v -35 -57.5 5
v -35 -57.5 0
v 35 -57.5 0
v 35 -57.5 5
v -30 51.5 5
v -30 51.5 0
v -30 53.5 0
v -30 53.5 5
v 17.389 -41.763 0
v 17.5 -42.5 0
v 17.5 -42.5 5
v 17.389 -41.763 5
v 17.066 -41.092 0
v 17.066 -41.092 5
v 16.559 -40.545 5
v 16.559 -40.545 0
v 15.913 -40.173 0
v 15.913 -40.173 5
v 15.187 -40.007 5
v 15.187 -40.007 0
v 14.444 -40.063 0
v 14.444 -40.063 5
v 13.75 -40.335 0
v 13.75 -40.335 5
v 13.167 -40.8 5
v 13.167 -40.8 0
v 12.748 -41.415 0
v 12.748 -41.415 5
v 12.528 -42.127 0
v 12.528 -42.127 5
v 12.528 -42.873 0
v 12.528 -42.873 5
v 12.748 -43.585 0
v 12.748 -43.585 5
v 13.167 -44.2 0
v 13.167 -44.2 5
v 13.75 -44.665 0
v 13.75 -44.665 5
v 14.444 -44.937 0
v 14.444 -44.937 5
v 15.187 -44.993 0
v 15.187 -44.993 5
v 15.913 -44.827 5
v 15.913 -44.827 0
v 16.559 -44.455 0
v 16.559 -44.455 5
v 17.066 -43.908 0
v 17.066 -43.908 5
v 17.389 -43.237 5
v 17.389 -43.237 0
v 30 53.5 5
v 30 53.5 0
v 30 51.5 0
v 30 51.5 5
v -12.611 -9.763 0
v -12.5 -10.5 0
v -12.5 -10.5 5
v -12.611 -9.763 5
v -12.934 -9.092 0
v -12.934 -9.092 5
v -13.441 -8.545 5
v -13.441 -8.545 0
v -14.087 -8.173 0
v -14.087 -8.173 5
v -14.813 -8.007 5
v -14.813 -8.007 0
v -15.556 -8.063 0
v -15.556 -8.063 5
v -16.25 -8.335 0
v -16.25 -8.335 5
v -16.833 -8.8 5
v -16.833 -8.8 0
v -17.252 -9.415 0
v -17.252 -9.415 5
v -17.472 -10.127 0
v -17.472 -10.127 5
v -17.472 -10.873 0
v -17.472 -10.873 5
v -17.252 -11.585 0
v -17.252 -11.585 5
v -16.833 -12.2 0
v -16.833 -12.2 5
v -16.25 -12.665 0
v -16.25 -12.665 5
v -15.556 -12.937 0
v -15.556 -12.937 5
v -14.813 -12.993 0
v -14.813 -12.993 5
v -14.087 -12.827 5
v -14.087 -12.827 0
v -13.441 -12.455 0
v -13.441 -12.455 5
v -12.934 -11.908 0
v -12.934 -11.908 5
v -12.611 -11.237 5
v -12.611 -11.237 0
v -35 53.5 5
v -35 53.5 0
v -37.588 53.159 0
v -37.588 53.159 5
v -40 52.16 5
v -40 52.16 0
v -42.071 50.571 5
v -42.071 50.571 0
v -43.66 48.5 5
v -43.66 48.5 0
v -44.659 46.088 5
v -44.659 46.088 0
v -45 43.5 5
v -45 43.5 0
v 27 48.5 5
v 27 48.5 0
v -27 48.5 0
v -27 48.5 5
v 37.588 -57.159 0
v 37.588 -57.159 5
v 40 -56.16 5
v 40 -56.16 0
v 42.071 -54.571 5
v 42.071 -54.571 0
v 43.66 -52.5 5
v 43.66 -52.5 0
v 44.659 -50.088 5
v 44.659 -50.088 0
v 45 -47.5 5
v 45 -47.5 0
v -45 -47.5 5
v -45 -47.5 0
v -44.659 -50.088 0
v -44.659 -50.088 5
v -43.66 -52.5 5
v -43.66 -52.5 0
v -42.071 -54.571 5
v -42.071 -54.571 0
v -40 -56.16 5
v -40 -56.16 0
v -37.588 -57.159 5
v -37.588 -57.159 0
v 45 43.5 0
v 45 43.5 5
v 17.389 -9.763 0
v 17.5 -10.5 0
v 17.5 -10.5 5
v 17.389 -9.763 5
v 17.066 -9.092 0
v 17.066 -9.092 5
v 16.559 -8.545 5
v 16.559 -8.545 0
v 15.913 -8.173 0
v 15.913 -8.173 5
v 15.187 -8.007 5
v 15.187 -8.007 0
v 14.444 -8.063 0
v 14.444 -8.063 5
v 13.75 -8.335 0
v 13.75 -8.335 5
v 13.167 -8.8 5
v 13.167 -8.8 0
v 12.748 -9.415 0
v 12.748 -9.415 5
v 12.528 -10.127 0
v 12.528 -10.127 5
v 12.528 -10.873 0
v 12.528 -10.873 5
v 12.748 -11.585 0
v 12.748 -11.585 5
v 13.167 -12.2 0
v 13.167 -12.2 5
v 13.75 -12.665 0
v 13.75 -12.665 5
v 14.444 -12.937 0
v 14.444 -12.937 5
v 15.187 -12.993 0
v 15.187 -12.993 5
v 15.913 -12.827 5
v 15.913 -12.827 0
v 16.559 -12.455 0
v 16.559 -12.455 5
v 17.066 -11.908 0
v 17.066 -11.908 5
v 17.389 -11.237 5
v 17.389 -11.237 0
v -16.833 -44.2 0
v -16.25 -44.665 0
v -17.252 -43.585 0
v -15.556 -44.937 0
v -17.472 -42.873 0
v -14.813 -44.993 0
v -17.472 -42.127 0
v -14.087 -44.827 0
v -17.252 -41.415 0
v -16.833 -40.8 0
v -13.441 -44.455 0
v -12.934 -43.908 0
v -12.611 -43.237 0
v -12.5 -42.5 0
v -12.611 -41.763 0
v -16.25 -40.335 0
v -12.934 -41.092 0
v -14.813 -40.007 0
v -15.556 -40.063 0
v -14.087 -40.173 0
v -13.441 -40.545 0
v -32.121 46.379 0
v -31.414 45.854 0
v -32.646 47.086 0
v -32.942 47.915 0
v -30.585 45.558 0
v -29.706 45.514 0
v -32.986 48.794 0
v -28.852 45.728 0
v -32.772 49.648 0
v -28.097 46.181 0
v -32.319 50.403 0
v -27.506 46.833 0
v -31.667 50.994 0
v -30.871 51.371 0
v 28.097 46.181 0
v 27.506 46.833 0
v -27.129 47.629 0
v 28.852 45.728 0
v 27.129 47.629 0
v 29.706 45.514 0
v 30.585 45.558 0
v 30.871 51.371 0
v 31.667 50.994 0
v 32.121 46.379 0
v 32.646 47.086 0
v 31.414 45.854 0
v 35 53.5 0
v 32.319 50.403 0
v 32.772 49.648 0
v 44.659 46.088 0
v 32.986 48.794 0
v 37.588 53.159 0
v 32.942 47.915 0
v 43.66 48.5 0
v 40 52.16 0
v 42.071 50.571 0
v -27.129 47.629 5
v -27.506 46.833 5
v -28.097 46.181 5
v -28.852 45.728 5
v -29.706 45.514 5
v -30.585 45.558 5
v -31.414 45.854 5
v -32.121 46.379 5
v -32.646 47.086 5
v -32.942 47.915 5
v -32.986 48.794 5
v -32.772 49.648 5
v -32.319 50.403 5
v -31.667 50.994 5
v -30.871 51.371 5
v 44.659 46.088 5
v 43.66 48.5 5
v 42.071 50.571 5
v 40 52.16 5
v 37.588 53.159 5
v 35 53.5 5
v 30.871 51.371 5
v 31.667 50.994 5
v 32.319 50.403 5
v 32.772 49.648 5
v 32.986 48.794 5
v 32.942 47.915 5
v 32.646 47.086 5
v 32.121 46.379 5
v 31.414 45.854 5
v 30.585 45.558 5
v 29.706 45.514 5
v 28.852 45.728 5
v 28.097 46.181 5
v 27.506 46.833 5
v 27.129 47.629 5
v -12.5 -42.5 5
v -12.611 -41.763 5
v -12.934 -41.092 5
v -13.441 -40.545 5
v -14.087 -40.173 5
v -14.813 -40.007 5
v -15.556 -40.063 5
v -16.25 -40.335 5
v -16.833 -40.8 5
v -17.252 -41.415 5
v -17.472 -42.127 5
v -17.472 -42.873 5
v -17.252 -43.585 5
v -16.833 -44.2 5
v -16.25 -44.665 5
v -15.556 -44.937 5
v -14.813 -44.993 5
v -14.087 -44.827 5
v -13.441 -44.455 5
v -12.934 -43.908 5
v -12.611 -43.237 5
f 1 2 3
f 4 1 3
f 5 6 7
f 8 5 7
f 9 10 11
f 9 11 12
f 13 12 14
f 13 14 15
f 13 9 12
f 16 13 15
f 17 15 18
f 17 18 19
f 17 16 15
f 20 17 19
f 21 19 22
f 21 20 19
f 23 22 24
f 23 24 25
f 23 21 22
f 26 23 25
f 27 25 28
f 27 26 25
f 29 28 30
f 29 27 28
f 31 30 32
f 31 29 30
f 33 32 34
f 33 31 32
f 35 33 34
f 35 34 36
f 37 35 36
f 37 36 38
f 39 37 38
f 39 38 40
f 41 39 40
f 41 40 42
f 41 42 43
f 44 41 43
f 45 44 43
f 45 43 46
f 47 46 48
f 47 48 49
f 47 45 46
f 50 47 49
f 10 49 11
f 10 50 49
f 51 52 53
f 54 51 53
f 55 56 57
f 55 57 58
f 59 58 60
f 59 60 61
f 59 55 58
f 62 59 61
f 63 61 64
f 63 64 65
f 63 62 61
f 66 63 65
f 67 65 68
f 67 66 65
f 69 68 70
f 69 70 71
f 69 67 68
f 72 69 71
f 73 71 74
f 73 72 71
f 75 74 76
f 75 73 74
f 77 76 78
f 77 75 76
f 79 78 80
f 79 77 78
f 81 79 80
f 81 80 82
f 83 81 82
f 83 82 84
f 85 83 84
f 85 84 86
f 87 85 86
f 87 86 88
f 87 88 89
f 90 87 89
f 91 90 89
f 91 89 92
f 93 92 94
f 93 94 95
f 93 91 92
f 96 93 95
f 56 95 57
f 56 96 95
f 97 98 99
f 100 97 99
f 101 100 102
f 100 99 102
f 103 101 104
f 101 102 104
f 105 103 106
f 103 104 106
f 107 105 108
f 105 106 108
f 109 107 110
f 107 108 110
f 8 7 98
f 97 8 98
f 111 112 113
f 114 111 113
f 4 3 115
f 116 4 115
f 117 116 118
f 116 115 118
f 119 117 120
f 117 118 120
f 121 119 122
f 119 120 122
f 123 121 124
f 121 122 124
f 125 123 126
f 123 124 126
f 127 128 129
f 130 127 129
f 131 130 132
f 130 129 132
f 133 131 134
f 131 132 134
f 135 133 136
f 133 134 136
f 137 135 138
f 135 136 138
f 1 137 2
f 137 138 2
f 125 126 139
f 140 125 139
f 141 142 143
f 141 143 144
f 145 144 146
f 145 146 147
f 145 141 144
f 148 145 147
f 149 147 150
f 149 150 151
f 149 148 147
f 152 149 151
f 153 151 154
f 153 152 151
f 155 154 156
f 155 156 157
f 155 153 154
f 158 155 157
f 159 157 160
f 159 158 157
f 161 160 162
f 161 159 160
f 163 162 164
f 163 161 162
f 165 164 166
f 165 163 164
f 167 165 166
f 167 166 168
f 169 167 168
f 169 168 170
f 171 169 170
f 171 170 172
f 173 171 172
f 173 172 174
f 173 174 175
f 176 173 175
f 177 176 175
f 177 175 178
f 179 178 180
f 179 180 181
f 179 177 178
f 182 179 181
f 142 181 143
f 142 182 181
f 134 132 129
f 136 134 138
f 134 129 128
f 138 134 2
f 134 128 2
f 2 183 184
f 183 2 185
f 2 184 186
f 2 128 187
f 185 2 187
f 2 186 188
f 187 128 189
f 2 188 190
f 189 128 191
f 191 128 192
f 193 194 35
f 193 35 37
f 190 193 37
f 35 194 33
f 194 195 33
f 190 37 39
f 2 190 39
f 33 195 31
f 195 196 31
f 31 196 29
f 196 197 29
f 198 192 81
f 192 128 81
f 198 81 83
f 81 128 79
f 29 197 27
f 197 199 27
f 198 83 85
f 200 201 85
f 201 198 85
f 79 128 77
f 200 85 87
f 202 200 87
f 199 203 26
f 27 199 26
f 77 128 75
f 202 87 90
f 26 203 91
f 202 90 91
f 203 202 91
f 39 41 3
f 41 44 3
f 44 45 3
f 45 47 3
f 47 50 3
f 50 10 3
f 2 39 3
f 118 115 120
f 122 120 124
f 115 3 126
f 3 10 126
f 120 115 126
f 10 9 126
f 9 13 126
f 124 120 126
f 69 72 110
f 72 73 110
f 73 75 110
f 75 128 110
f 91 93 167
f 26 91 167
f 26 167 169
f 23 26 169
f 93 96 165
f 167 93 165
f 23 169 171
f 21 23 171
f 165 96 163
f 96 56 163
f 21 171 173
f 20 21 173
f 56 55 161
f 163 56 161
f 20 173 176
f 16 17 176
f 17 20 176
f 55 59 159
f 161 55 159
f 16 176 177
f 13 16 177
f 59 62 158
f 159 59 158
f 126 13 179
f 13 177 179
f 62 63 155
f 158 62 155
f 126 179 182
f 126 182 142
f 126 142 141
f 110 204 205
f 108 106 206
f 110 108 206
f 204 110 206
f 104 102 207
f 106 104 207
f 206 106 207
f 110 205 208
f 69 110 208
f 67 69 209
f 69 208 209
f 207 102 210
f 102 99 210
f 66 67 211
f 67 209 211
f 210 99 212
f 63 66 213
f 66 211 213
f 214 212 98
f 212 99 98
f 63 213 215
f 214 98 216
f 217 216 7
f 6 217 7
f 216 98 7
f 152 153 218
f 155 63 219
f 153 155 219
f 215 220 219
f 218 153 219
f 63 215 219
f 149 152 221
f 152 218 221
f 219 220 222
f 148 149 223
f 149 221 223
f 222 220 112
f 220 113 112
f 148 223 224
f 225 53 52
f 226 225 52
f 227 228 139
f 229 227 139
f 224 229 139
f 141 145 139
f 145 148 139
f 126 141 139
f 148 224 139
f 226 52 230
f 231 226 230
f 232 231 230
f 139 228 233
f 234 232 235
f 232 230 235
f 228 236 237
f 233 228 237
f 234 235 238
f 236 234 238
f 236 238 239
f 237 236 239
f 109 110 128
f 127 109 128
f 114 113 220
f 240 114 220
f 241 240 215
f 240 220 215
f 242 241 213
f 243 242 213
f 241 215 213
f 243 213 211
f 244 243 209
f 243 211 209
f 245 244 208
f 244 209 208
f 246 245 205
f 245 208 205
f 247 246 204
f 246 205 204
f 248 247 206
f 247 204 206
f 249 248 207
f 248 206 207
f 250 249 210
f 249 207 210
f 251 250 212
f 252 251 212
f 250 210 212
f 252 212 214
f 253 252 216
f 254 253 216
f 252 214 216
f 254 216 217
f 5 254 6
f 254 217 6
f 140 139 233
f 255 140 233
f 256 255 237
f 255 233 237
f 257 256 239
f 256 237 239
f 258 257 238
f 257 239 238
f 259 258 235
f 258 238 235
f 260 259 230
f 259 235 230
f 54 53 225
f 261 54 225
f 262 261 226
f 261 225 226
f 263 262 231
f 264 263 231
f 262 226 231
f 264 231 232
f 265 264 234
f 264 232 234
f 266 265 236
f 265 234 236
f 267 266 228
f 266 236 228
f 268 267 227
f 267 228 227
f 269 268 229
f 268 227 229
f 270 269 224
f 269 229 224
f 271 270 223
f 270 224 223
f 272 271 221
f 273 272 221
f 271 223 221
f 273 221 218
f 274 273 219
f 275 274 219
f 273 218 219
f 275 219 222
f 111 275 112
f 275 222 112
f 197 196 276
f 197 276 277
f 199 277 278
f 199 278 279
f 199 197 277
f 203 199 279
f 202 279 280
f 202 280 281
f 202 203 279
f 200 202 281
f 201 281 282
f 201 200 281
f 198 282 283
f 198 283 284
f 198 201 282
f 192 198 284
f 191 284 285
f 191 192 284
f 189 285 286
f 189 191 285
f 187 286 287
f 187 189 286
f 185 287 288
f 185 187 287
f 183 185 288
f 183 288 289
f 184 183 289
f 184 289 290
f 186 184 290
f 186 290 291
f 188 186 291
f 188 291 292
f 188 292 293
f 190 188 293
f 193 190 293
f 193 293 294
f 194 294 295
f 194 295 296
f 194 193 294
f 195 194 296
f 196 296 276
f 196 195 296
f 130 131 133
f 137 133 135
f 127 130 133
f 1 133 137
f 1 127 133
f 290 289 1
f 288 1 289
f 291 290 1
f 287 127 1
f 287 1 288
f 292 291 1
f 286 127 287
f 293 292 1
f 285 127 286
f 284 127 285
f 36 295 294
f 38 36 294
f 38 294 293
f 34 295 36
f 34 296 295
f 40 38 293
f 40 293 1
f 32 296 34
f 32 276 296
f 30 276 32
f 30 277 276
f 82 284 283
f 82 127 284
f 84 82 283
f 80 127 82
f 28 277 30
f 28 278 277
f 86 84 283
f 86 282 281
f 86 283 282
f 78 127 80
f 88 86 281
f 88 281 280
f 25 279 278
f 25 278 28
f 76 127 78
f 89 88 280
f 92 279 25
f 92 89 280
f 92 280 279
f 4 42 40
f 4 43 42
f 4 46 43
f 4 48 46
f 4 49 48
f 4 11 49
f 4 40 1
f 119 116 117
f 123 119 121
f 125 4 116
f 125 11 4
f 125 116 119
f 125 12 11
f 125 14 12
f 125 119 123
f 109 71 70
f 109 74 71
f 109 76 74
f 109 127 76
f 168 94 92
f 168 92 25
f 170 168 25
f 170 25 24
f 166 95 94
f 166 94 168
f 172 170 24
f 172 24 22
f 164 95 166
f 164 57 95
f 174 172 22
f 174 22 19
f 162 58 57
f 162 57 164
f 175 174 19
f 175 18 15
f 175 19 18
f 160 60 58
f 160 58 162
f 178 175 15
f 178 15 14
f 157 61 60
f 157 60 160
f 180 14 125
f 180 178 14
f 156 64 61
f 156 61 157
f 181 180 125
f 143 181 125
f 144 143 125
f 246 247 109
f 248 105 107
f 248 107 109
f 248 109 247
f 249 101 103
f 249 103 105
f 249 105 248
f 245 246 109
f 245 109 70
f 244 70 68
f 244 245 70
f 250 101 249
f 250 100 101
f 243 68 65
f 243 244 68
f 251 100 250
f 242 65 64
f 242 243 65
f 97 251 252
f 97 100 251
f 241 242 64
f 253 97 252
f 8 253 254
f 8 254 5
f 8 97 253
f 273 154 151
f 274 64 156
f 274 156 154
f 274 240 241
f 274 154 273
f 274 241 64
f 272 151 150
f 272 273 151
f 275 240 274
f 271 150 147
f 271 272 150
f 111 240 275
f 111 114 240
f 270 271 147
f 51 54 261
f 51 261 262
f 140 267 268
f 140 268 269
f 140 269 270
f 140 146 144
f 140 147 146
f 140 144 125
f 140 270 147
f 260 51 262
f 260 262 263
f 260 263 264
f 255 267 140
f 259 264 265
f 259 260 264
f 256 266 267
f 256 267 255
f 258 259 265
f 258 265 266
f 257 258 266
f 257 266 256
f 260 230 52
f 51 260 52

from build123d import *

# Parameters (mm, degrees)
F0_R     = 2.5
F1_DEPTH = 5


with BuildPart() as f1:
    # F0 (on Top) → F1 (new body)
    with BuildSketch(Plane.XY):
        with BuildLine():
            Line((-35, -57.5), (35, -57.5))
            ThreePointArc((35, -57.5), (42.071068, -54.571068), (45, -47.5))
            Line((45, -47.5), (45, 43.5))
            ThreePointArc((45, 43.5), (42.071068, 50.571068), (35, 53.5))
            Line((35, 53.5), (30, 53.5))
            Line((30, 53.5), (30, 51.5))
            ThreePointArc((30, 51.5), (32.12132, 46.37868), (27, 48.5))
            Line((27, 48.5), (-27, 48.5))
            ThreePointArc((-27, 48.5), (-32.12132, 46.37868), (-30, 51.5))
            Line((-30, 51.5), (-30, 53.5))
            Line((-30, 53.5), (-35, 53.5))
            ThreePointArc((-35, 53.5), (-42.071068, 50.571068), (-45, 43.5))
            Line((-45, 43.5), (-45, -47.5))
            ThreePointArc((-45, -47.5), (-42.071068, -54.571068), (-35, -57.5))
        make_face()
        with Locations((-15, -42.5)):
            Circle(F0_R, mode=Mode.SUBTRACT)
        with Locations((-15, -10.5)):
            Circle(F0_R, mode=Mode.SUBTRACT)
        with Locations((15, -42.5)):
            Circle(F0_R, mode=Mode.SUBTRACT)
        with Locations((15, -10.5)):
            Circle(F0_R, mode=Mode.SUBTRACT)
    extrude(amount=F1_DEPTH)


solid = f1.part
